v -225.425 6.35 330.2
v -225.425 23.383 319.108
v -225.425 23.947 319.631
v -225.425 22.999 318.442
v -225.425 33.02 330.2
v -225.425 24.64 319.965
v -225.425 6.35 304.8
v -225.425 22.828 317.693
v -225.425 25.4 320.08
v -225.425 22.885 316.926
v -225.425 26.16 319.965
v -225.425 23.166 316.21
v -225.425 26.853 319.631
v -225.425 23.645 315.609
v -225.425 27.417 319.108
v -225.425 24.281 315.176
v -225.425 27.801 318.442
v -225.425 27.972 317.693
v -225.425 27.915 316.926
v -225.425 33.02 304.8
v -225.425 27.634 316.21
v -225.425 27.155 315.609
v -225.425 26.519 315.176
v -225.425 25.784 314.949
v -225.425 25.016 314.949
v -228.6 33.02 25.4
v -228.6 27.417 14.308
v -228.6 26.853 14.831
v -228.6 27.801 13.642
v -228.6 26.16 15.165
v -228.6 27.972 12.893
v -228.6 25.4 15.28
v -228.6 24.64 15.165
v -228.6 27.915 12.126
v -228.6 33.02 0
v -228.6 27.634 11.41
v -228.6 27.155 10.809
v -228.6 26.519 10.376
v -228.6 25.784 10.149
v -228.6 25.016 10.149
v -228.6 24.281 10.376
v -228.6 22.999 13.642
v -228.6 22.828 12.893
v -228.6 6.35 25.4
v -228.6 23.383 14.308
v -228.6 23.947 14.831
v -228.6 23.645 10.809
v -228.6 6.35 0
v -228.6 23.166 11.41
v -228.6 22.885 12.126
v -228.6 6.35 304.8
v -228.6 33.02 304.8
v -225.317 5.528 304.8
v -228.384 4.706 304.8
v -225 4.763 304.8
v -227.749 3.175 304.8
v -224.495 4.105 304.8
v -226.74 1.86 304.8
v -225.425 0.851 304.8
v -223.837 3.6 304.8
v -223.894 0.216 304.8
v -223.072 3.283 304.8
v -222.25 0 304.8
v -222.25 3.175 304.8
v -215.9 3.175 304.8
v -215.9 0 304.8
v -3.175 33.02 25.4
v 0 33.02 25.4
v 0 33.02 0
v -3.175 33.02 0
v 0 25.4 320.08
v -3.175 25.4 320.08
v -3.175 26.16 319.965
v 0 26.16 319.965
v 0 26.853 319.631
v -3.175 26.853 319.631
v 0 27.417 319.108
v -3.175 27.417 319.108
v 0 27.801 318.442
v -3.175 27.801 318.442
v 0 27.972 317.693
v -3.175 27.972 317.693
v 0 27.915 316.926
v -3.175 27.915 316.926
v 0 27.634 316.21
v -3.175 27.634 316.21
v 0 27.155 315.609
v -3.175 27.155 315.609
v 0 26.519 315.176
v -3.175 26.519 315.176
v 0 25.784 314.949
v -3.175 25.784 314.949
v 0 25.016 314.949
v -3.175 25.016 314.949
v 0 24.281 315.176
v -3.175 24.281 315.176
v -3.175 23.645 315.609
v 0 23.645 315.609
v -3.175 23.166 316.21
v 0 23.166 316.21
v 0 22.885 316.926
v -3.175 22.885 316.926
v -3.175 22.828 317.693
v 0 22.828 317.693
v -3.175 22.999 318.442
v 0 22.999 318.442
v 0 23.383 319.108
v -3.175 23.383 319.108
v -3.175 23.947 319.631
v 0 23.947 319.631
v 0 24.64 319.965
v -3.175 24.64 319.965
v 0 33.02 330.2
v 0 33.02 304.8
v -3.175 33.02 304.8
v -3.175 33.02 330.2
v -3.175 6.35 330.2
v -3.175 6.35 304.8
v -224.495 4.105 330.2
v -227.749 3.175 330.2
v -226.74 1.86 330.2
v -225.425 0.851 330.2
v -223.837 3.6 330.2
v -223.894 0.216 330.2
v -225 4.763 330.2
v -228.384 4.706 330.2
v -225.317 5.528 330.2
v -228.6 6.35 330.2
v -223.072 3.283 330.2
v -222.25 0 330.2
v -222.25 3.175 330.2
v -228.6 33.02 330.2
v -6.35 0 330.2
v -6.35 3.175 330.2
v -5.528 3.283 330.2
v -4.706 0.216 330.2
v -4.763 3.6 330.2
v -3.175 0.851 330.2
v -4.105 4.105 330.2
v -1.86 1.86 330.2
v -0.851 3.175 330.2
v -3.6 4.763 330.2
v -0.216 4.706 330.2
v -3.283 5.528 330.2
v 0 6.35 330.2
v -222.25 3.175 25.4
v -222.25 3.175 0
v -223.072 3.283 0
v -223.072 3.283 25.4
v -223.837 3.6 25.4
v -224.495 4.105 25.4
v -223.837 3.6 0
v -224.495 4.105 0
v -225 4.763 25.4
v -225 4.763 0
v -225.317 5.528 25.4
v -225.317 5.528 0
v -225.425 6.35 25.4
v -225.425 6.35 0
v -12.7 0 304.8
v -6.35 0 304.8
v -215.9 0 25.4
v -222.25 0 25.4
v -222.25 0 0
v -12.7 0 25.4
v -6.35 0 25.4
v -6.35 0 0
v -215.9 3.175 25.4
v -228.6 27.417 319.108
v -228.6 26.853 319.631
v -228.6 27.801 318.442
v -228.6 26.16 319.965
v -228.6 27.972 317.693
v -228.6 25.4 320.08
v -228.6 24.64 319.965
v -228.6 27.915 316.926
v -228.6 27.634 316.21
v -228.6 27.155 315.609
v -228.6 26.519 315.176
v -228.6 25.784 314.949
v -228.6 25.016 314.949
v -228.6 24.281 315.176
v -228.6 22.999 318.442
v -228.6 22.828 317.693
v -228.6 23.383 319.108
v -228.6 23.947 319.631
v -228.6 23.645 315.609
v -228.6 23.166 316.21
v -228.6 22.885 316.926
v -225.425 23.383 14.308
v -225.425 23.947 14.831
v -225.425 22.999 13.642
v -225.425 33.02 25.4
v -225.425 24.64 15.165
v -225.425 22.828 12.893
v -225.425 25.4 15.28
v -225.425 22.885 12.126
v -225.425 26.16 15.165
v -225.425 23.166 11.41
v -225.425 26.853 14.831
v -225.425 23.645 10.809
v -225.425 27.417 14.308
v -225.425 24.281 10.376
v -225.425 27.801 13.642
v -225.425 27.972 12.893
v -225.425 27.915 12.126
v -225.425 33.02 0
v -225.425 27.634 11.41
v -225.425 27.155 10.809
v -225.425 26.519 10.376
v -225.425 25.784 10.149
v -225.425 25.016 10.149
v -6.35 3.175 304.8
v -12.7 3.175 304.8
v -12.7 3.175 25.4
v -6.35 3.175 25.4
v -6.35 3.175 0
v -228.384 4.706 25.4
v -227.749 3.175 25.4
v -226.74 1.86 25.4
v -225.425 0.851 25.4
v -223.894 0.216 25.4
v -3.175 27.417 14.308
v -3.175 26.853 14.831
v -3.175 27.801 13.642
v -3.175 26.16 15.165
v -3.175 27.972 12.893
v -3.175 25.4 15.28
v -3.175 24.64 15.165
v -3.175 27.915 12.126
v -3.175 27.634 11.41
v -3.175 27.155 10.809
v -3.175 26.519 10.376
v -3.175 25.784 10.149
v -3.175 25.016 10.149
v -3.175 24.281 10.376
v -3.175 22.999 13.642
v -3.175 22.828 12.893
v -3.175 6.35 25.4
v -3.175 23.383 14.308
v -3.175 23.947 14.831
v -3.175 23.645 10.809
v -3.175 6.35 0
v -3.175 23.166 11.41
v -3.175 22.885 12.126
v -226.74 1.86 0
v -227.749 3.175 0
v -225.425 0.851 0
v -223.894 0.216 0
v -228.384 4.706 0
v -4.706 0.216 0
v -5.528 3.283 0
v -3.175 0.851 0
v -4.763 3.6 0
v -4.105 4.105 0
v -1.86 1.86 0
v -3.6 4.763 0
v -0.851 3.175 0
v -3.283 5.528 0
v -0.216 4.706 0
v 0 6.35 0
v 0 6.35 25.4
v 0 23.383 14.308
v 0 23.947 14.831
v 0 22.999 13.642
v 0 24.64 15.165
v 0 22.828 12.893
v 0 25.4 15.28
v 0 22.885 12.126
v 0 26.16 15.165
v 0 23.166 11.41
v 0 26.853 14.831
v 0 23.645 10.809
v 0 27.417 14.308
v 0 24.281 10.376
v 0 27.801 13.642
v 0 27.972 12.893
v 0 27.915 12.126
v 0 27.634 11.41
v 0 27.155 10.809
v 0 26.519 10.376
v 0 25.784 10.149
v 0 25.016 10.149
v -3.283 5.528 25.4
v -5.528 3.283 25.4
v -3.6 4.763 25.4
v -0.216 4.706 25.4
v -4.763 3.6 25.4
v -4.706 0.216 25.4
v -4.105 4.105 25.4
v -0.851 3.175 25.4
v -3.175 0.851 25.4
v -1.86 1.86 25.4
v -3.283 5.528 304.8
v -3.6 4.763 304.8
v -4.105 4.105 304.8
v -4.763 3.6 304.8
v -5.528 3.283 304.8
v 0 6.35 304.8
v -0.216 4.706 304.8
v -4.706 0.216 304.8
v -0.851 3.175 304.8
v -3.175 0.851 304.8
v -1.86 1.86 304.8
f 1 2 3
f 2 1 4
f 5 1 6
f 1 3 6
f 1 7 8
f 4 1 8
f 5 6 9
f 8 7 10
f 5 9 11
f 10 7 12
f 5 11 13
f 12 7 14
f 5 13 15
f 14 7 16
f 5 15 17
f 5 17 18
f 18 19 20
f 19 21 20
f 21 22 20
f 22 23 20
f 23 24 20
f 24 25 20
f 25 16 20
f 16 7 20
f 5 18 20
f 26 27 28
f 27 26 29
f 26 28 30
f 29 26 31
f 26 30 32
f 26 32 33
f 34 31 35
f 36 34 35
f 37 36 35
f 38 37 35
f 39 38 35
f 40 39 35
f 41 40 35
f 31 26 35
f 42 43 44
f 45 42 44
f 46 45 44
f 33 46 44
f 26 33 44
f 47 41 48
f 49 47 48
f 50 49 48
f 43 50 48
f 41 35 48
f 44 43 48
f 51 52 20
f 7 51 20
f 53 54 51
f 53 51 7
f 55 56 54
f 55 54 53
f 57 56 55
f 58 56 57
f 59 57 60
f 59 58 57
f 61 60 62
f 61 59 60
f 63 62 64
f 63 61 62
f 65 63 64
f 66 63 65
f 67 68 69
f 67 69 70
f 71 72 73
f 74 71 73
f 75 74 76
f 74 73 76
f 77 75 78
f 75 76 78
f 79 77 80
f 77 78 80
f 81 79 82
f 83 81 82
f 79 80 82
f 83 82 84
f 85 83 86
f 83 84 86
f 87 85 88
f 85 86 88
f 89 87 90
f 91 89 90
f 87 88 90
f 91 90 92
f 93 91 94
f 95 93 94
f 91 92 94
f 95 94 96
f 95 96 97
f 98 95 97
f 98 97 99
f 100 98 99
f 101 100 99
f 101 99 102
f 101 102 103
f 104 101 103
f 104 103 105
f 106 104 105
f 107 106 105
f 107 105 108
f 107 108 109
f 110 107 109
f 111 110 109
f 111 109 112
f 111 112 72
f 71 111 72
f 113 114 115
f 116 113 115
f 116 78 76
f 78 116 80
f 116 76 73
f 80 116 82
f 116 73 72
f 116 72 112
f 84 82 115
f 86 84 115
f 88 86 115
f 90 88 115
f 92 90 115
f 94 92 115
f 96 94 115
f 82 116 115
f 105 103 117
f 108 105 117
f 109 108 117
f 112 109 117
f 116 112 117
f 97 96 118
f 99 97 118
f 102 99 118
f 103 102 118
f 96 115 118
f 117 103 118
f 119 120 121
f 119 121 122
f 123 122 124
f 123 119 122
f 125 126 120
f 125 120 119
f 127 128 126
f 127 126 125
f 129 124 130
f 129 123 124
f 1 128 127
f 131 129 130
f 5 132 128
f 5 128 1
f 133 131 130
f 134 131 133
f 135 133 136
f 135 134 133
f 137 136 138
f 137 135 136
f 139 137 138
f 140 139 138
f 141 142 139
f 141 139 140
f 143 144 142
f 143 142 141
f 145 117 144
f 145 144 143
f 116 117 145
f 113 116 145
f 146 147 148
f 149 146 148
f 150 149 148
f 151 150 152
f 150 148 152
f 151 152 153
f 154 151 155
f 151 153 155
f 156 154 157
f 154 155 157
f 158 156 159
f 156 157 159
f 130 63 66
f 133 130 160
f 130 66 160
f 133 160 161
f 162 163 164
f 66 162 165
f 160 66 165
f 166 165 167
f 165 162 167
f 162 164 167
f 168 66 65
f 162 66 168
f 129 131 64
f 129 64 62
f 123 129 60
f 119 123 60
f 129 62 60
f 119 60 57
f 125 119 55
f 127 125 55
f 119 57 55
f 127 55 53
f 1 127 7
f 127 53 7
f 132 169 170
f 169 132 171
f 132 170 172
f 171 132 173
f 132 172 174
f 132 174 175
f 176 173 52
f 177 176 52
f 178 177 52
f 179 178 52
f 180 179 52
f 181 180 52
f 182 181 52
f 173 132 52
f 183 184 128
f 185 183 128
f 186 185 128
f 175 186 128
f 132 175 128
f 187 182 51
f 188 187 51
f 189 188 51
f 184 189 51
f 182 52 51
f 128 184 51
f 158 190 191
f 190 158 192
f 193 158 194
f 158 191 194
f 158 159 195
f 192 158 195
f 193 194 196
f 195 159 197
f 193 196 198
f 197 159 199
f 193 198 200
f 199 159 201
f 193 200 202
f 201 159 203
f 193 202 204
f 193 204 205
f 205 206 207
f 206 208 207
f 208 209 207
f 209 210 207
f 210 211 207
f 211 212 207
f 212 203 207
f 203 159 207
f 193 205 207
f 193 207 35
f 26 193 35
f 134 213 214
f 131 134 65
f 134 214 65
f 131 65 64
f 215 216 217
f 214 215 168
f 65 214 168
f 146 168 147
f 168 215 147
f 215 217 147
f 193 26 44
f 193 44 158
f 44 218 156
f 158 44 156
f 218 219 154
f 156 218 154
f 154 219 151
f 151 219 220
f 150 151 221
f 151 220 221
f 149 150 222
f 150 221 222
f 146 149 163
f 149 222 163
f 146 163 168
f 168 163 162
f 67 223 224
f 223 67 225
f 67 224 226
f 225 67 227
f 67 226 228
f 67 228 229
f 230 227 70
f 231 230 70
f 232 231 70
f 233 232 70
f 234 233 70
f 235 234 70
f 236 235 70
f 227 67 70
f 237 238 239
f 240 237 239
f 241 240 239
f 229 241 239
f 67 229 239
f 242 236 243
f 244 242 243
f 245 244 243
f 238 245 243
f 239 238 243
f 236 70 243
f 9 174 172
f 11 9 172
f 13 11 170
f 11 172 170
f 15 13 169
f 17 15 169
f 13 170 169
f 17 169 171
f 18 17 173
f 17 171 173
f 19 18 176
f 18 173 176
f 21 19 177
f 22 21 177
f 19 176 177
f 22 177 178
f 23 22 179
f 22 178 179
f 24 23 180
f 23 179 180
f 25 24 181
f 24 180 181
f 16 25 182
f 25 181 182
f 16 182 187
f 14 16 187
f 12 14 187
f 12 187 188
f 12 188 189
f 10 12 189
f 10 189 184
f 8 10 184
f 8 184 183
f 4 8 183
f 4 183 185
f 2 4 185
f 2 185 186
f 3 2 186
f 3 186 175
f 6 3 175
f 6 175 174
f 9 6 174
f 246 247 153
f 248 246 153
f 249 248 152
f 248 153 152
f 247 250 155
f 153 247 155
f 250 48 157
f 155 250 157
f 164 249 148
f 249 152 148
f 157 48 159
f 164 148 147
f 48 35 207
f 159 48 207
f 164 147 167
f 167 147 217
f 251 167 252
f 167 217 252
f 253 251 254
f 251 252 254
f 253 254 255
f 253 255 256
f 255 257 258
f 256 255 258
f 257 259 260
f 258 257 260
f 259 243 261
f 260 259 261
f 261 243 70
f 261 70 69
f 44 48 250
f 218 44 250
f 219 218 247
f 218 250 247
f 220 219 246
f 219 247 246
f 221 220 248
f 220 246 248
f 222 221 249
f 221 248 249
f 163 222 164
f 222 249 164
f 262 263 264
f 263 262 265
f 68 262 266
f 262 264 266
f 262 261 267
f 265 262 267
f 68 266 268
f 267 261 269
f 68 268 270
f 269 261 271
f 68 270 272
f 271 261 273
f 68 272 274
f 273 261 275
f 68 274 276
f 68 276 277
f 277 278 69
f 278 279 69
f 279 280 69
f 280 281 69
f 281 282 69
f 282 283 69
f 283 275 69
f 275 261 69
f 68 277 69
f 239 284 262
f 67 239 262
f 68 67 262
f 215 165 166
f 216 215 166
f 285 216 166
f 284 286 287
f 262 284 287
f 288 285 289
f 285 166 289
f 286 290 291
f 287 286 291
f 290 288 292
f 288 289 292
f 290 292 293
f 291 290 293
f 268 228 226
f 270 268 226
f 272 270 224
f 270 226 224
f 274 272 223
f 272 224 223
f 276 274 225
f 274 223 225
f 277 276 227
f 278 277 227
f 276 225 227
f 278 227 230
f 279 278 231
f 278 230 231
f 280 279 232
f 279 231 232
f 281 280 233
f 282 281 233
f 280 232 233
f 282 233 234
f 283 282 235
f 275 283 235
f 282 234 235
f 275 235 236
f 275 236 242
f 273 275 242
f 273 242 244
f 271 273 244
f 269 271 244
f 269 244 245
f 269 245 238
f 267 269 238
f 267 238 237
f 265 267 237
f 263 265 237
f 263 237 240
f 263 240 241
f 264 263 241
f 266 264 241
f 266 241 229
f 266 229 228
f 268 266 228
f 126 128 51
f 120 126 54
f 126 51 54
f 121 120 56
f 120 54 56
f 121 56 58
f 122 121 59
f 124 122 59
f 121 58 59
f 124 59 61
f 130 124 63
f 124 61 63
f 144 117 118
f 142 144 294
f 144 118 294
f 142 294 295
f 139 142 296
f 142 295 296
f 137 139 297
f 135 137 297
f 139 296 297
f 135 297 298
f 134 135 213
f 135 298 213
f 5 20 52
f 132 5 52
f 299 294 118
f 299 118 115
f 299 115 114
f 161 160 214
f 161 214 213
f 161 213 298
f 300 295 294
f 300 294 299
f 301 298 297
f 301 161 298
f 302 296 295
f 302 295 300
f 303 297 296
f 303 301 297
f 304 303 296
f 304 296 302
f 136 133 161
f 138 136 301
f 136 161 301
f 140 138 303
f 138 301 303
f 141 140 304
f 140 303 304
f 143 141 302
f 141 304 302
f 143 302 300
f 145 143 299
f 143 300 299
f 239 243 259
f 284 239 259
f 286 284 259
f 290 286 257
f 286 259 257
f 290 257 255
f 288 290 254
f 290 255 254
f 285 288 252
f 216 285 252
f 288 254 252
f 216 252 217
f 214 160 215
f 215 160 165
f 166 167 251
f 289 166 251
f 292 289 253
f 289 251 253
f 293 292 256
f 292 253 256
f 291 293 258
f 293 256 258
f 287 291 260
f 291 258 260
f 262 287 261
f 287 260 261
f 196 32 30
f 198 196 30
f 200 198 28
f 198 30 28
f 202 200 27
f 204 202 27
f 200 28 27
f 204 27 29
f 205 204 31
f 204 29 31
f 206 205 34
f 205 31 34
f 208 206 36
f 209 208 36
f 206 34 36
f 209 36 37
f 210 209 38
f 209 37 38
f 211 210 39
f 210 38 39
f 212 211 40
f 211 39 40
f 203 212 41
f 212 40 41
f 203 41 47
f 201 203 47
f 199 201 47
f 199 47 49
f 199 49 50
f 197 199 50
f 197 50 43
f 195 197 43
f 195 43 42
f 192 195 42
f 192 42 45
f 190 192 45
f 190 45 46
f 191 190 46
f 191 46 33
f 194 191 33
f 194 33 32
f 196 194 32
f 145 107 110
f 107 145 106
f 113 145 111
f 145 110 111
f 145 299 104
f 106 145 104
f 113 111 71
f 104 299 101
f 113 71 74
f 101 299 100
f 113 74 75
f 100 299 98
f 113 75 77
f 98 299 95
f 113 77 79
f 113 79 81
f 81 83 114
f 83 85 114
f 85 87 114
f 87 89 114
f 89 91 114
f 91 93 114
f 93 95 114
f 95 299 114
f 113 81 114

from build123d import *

# Parameters (mm, degrees)
BASE_FLANGE1_DEPTH      = 330.2
SKETCH21_R              = 2.5796875
CUT_EXTRUDE1_DEPTH      = 403.964415799
CUT_EXTRUDE2_DEPTH      = 403.716679596
CUT_EXTRUDE2_DEPTH_BACK = 403.716679596
SKETCH22_W              = 50.8
SKETCH22_H              = 279.4


# Sheet-metal steps are written as plain solids
with BuildPart() as part:
    # Sketch7 → Base-Flange1 (new body)
    with BuildSketch(Plane.XY):
        with BuildLine():
            Line((-228.6, 33.02), (-228.6, 6.35))
            ThreePointArc((-228.6, 6.35), (-226.740128061, 1.859871939), (-222.25, 0))
            Line((-222.25, 0), (-6.35, 0))
            ThreePointArc((-6.35, 0), (-1.859871939, 1.859871939), (0, 6.35))
            Line((0, 6.35), (0, 33.02))
            Line((0, 33.02), (-3.175, 33.02))
            Line((-3.175, 33.02), (-3.175, 6.35))
            ThreePointArc((-3.175, 6.35), (-4.10493597, 4.10493597), (-6.35, 3.175))
            Line((-6.35, 3.175), (-222.25, 3.175))
            ThreePointArc((-222.25, 3.175), (-224.49506403, 4.10493597), (-225.425, 6.35))
            Line((-225.425, 6.35), (-225.425, 33.02))
            Line((-225.425, 33.02), (-228.6, 33.02))
        make_face()
    extrude(amount=BASE_FLANGE1_DEPTH)

    # Sketch21 → Cut-Extrude1 (cut, through all)
    with BuildSketch(Plane.ZY.offset(228.6)):
        with Locations((12.7, 25.4)):
            Circle(SKETCH21_R)
        with Locations((317.5, 25.4)):
            Circle(SKETCH21_R)
    extrude(amount=-CUT_EXTRUDE1_DEPTH, mode=Mode.SUBTRACT)

    # Sketch22 → Cut-Extrude2 (cut, two sides: drawn at the far end of the back side and taken through both)
    with BuildSketch(Plane(origin=(0, 3.175, 0), x_dir=(1, 0, 0), z_dir=(0, 1, 0)).offset(-CUT_EXTRUDE2_DEPTH_BACK)):
        with Locations((-241.3, -165.1)):
            Rectangle(SKETCH22_W, SKETCH22_H)
        with Locations((12.7, -165.1)):
            Rectangle(SKETCH22_W, SKETCH22_H)
    extrude(amount=CUT_EXTRUDE2_DEPTH + CUT_EXTRUDE2_DEPTH_BACK, mode=Mode.SUBTRACT)


solid = part.part
